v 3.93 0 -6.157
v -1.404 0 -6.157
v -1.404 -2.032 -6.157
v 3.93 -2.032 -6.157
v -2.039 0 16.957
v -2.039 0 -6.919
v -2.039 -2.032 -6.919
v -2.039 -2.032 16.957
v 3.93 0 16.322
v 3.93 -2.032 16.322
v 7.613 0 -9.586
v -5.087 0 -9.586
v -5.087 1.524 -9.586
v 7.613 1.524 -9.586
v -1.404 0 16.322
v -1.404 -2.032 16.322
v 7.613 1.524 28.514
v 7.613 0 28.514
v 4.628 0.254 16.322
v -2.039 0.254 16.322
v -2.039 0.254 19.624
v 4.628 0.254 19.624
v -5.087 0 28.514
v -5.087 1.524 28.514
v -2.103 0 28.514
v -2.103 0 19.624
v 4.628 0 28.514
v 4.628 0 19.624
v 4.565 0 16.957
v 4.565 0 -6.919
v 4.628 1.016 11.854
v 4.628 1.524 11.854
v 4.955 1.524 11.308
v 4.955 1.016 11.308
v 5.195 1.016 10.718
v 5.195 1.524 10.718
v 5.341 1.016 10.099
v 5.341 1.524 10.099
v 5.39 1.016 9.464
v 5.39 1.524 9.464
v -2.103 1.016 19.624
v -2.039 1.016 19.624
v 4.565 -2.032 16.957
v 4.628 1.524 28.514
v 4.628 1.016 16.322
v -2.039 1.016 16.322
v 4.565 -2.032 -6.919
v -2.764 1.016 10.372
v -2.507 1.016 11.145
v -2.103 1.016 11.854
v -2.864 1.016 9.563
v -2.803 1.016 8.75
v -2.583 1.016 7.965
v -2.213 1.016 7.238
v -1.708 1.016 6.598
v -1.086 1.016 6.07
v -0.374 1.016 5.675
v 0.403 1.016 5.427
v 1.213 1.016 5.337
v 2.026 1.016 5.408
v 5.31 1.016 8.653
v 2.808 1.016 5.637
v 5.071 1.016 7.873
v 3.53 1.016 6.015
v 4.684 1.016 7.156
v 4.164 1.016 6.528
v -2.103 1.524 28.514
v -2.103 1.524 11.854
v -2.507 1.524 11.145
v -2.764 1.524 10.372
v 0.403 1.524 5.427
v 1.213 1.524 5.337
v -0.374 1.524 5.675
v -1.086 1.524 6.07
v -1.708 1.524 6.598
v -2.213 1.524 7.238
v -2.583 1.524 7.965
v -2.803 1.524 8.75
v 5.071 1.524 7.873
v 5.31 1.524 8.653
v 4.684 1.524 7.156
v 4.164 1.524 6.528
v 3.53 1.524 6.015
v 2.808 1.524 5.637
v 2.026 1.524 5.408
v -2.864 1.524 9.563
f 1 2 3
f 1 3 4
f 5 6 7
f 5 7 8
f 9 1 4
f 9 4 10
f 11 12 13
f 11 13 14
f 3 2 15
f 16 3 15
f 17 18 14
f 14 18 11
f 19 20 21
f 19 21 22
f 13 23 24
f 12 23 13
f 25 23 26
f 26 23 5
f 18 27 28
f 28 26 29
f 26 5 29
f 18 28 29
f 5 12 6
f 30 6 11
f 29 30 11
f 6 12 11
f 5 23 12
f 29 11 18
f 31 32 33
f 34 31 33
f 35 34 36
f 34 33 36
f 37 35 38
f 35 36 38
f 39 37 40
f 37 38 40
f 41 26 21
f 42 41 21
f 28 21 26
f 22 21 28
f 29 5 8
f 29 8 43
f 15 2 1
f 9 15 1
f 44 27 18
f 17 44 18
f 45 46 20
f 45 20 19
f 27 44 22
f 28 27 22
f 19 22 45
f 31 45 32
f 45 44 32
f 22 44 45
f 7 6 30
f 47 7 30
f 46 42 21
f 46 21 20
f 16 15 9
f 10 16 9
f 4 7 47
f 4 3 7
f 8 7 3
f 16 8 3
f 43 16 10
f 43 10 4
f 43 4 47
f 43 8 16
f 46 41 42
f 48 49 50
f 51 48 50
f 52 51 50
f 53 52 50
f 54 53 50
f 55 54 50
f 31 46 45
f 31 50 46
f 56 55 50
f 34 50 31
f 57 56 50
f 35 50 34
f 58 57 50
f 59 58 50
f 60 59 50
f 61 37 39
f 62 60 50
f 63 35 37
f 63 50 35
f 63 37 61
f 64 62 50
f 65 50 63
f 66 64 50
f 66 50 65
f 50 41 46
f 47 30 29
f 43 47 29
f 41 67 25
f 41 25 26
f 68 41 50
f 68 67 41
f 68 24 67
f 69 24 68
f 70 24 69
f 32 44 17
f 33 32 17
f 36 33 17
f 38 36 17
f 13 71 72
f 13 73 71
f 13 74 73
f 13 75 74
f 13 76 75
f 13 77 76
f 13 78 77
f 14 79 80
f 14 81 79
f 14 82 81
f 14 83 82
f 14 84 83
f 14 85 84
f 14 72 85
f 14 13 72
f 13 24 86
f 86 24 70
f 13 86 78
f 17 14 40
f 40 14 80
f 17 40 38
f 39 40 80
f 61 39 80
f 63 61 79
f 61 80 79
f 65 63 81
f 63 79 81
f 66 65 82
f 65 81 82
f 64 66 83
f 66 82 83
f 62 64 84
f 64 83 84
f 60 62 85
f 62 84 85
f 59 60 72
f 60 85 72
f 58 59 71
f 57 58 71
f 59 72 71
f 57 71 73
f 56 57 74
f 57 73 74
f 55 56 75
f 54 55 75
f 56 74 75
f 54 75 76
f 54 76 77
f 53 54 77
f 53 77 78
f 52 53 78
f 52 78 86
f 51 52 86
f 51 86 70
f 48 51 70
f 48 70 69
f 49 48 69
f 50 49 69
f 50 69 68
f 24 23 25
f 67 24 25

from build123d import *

# Parameters (mm, degrees)
SKETCH1_W           = 12.7
SKETCH1_H           = 38.1
BOSS_EXTRUDE1_DEPTH = 1.524
SKETCH2_W           = 6.604
SKETCH2_H           = 23.876
SKETCH2_W_2         = 5.334
SKETCH2_H_2         = 22.479000001
BOSS_EXTRUDE2_DEPTH = 2.032
CUT_EXTRUDE2_DEPTH  = 0.508
SKETCH6_W           = 6.731
SKETCH6_H           = 8.89
CUT_EXTRUDE3_DEPTH  = 30.669746225
SKETCH7_W           = 6.6675
SKETCH7_H           = 3.302
CUT_EXTRUDE4_DEPTH  = 0.762


with BuildPart() as part:
    # Sketch1 → Boss-Extrude1 (new body)
    with BuildSketch(Plane(origin=(0, 0, 0), x_dir=(1, 0, 0), z_dir=(0, 1, 0))):
        with Locations((1.262648046, -9.464051393)):
            Rectangle(SKETCH1_W, SKETCH1_H)
    extrude(amount=BOSS_EXTRUDE1_DEPTH)

    # Sketch2 → Boss-Extrude2 (add)
    with BuildSketch(Plane.XZ):
        with Locations((1.262648046, 5.019051392)):
            Rectangle(SKETCH2_W, SKETCH2_H)
        with Locations((1.262648046, 5.082551393)):
            Rectangle(SKETCH2_W_2, SKETCH2_H_2, mode=Mode.SUBTRACT)
    extrude(amount=BOSS_EXTRUDE2_DEPTH)

    # Sketch5 → Cut-Extrude2 (cut)
    with BuildSketch(Plane(origin=(0, 1.524, 0), x_dir=(1, 0, 0), z_dir=(0, 1, 0))):
        with BuildLine():
            Line((-2.102851954, -11.853542133), (-2.102851954, -28.514051393))
            Line((-2.102851954, -28.514051393), (4.628148046, -28.514051393))
            Line((4.628148046, -28.514051393), (4.628148046, -11.853542133))
            ThreePointArc((4.628148046, -11.853542133), (1.262648045, -5.336551393), (-2.102851954, -11.853542134))
        make_face()
    extrude(amount=-CUT_EXTRUDE2_DEPTH, mode=Mode.SUBTRACT)

    # Sketch6 → Cut-Extrude3 (cut, through all)
    with BuildSketch(Plane(origin=(0, 1.016, 0), x_dir=(1, 0, 0), z_dir=(0, 1, 0))):
        with Locations((1.262648046, -24.069051393)):
            Rectangle(SKETCH6_W, SKETCH6_H)
    extrude(amount=-CUT_EXTRUDE3_DEPTH, mode=Mode.SUBTRACT)

    # Sketch7 → Cut-Extrude4 (cut)
    with BuildSketch(Plane(origin=(0, 1.016, 0), x_dir=(1, 0, 0), z_dir=(0, 1, 0))):
        with Locations((1.294398046, -17.973051393)):
            Rectangle(SKETCH7_W, SKETCH7_H)
    extrude(amount=-CUT_EXTRUDE4_DEPTH, mode=Mode.SUBTRACT)


solid = part.part
